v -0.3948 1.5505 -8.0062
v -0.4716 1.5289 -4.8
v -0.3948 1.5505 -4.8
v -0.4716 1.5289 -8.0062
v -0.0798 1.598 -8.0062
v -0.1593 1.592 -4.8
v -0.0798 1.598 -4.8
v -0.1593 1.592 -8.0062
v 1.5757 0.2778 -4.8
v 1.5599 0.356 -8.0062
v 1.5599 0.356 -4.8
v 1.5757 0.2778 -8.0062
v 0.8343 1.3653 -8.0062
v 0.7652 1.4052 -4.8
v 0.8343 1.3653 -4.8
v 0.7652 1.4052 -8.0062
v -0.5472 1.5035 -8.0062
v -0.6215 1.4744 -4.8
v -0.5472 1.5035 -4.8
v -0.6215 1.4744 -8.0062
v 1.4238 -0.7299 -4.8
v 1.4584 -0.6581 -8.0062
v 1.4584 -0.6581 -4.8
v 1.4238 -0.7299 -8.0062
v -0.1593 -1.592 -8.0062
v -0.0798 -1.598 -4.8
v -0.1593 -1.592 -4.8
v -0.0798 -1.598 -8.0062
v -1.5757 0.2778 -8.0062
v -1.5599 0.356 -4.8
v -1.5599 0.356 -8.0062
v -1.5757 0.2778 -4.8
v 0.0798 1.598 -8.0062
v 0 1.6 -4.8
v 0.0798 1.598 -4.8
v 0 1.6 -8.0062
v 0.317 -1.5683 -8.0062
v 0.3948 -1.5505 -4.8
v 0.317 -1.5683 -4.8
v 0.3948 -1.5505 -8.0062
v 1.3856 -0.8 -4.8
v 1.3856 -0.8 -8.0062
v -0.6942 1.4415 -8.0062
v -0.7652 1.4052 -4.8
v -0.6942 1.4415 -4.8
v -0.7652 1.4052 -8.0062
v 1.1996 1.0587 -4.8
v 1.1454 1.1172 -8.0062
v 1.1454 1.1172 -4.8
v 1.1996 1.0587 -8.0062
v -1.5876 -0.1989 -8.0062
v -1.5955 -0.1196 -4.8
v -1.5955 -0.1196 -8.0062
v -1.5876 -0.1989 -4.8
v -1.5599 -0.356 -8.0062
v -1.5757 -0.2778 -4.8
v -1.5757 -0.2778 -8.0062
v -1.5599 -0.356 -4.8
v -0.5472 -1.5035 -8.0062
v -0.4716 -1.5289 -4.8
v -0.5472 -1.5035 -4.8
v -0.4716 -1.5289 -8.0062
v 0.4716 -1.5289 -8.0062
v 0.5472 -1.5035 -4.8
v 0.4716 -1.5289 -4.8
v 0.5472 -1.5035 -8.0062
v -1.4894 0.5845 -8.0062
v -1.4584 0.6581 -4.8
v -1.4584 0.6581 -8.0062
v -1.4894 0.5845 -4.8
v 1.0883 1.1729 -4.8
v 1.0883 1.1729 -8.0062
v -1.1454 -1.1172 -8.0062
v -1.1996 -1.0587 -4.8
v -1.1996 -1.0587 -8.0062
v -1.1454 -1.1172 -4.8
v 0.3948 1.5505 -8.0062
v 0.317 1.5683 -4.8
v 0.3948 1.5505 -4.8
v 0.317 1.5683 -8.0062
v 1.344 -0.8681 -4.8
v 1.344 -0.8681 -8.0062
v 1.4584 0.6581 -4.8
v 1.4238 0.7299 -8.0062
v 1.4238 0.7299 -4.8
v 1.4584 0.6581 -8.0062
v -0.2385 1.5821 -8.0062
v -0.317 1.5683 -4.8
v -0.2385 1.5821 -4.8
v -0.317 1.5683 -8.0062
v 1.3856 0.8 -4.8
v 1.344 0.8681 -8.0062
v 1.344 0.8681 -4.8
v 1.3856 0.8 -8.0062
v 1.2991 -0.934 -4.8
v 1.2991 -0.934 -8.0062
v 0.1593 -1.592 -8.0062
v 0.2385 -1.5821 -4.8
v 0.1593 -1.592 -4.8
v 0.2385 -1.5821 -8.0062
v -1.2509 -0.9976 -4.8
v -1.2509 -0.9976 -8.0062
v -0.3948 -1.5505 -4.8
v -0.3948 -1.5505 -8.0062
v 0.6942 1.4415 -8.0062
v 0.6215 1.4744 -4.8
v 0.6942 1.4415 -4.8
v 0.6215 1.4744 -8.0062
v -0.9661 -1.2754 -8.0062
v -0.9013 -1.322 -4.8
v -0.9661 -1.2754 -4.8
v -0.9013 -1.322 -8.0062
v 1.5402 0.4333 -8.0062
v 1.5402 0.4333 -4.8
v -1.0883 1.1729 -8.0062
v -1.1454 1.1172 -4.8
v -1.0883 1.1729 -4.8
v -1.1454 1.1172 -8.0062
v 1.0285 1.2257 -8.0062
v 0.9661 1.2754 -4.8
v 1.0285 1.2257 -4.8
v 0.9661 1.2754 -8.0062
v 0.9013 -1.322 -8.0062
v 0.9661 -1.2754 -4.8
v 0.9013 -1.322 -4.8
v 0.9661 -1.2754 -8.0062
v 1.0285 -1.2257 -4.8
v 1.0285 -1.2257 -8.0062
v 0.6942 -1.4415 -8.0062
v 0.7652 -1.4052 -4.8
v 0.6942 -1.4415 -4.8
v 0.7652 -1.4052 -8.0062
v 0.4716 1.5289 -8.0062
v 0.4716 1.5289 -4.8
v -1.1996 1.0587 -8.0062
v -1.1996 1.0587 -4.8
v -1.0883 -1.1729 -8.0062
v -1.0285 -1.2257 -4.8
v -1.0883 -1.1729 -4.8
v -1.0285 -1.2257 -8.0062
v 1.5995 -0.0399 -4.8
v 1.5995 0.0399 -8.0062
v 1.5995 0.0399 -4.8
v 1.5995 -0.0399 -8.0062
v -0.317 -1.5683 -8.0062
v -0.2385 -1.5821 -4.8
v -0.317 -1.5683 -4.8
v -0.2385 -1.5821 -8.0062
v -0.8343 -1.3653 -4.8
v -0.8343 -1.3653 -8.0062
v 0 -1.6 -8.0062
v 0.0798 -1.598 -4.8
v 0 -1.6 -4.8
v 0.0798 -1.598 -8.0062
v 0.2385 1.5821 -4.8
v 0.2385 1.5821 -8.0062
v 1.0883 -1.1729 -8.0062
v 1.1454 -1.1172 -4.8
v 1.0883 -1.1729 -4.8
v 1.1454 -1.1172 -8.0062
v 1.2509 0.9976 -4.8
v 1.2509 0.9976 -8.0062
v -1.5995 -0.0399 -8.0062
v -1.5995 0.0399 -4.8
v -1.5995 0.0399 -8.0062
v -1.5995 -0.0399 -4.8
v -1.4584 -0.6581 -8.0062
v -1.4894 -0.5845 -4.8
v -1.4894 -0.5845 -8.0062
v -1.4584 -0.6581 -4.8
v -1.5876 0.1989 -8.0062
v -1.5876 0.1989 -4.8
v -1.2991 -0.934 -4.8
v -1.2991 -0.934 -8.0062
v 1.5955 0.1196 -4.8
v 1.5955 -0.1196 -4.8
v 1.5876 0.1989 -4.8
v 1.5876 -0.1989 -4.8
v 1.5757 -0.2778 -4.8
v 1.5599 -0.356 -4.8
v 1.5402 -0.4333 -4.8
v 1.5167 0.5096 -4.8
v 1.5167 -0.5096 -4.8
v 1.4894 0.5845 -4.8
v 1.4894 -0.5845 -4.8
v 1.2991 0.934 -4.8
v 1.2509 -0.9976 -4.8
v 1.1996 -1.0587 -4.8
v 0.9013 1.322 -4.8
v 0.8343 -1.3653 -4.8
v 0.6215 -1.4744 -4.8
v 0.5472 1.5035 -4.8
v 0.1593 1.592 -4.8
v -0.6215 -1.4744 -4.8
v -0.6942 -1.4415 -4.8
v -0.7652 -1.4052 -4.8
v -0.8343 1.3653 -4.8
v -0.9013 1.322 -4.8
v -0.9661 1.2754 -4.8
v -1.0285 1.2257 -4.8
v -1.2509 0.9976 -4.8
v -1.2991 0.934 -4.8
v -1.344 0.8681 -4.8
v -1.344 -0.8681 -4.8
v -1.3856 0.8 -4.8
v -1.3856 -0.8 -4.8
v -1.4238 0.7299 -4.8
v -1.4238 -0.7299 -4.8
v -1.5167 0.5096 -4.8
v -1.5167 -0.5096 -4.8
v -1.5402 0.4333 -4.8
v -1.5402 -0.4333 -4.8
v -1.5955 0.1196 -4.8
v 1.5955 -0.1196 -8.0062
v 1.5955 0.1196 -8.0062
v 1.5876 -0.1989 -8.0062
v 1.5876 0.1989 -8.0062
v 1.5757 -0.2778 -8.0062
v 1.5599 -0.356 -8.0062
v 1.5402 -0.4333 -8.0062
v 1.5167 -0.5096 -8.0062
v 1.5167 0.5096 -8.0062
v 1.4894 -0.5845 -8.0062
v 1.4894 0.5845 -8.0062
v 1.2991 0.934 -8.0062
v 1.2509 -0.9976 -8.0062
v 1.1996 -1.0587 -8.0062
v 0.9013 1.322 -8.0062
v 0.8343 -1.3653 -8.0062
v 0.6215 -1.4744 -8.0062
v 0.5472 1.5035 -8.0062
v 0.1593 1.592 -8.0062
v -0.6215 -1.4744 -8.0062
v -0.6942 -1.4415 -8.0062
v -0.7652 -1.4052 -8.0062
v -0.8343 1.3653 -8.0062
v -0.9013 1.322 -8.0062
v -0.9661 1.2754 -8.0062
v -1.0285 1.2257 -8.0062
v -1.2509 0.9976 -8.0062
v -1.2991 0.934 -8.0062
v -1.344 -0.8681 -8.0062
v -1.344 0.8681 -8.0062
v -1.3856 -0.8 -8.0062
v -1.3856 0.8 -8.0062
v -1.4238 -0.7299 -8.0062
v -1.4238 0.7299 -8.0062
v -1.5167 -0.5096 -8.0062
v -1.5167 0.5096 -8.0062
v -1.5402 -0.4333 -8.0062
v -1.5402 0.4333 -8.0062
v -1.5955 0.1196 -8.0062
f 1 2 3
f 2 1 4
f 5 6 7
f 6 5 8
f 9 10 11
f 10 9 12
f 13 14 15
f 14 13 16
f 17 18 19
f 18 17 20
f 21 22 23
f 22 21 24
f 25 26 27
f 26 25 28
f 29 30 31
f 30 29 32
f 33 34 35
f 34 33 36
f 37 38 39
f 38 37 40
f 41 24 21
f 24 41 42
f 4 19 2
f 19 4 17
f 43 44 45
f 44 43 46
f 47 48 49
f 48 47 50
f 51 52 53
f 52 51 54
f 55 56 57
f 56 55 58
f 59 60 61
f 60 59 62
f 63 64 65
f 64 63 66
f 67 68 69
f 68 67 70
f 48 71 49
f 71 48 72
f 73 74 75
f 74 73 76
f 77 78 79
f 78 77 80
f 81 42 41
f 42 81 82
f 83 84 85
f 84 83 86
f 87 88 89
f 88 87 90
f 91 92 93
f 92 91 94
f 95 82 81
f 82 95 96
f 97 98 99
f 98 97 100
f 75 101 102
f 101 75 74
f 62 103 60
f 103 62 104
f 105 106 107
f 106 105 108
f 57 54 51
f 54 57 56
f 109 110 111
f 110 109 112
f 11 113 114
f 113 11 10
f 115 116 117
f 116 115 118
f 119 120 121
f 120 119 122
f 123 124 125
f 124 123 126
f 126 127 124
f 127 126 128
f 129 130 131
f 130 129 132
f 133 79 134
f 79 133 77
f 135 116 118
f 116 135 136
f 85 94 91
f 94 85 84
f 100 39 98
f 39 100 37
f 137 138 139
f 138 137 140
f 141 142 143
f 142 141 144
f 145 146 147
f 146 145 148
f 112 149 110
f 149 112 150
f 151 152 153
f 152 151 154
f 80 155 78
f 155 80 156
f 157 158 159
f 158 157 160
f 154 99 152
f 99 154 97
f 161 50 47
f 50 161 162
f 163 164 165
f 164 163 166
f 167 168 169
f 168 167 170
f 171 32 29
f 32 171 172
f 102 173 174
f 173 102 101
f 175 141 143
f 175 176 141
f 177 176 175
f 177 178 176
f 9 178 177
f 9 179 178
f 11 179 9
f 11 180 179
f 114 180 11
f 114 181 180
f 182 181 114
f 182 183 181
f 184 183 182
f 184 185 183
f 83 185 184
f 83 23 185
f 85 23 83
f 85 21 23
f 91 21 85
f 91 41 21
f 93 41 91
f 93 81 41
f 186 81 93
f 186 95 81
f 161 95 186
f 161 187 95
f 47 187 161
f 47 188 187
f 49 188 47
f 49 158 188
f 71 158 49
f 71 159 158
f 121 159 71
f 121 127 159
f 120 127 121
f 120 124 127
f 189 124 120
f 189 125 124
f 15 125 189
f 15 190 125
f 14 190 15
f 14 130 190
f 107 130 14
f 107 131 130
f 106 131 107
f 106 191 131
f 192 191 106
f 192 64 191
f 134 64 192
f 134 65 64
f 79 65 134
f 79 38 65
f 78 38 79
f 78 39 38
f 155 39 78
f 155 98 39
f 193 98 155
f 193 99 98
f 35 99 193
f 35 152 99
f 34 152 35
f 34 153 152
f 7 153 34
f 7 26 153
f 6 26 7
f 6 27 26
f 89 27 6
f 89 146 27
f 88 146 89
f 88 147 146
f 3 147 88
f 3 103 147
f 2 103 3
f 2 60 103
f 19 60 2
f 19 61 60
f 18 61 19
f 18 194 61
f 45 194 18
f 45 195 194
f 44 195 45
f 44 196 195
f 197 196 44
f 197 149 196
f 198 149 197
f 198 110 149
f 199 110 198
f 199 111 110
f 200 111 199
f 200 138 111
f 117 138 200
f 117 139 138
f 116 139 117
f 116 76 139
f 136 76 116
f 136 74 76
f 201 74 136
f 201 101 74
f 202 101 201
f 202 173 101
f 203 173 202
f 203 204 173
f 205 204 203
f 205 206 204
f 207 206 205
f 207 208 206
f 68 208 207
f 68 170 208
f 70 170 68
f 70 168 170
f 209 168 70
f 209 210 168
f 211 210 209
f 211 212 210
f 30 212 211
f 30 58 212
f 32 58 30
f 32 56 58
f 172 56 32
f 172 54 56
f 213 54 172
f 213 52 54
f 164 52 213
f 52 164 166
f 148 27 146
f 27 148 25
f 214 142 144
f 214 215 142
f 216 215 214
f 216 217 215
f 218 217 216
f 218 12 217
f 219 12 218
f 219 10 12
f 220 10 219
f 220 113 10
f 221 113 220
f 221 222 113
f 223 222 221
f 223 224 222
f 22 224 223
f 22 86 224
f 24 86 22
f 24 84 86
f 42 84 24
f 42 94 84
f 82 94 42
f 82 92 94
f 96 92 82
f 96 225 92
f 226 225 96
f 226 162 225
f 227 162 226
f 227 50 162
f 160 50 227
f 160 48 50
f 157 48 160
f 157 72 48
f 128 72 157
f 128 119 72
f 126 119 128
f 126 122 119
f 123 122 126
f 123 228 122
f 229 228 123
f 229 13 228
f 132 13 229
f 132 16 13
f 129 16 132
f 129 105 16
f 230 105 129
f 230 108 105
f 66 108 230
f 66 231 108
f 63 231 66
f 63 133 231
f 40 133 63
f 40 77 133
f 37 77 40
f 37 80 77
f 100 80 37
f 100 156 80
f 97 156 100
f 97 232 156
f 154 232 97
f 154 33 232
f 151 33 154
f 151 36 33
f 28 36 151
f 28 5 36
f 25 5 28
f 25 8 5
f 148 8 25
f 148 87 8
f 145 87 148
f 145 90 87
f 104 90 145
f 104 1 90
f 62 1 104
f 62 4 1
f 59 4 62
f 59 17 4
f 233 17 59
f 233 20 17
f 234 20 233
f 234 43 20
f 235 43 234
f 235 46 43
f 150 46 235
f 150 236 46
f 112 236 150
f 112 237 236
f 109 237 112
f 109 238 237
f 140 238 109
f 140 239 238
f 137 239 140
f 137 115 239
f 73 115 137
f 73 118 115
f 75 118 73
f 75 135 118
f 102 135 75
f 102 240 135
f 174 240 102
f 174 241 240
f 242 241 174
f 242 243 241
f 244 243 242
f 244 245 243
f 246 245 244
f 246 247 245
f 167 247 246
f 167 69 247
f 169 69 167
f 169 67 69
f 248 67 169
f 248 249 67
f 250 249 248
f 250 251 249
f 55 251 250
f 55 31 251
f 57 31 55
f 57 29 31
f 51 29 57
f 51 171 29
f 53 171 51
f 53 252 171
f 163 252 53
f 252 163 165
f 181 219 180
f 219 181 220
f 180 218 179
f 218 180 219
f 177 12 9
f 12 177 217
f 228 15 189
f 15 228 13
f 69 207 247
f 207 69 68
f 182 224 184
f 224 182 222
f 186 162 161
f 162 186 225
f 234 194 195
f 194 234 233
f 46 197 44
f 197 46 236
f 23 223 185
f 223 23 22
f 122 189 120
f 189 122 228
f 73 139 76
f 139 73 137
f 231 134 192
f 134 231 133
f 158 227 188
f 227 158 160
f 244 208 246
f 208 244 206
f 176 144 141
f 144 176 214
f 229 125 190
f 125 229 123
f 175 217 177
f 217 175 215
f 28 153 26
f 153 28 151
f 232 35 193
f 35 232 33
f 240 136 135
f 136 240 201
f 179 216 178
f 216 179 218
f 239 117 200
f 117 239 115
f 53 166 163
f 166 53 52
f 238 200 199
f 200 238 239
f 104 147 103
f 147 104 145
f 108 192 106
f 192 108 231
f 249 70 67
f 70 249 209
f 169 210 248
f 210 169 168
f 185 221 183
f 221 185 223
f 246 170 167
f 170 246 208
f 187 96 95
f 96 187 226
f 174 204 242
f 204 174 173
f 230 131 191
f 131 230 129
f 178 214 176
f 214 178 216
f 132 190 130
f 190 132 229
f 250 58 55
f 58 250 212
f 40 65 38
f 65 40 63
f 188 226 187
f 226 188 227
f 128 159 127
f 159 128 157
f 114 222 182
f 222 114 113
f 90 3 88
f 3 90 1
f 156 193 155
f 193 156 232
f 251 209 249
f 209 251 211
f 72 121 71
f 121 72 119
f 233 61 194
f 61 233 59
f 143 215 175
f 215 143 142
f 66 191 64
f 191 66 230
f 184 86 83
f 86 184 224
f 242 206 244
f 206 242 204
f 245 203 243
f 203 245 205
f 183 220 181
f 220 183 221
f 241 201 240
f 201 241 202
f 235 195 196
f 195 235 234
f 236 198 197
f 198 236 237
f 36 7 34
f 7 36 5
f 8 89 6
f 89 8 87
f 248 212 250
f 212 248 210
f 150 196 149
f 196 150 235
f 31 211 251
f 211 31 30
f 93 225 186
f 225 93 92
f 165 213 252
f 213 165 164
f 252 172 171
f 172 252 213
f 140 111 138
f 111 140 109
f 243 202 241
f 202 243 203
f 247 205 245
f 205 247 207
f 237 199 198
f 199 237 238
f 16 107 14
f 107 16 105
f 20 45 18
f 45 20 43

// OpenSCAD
use <../lib.scad>
use <../p/48/1-8chrd.scad>
use <../p/48/1-8cyli.scad>
use <../p/48/1-8edge.scad>
use <../p/48/4-4con12.scad>
use <../p/48/4-4cyli.scad>
use <../p/48/4-4edge.scad>
use <../p/48/4-4ndis.scad>
use <../p/48/4-4rin12.scad>
use <../p/48/4-4rin14.scad>
use <../p/48/4-4ring1.scad>
use <../p/48/4-4ring3.scad>
use <../p/48/4-4ring4.scad>
use <../p/48/4-4ring5.scad>
use <../p/48/4-4ring6.scad>
use <../p/rect.scad>
use <../p/stud3.scad>
$fa=1; $fs=0.2;
function ldraw_lib__4141(realsolid=false) = [
// 0 ~Technic Differential Casing
// 0 Name: 4141.dat
// 0 Author: Philippe Hurbain [Philo]
// 0 !LDRAW_ORG Part UPDATE 2011-02
// 0 !LICENSE Licensed under CC BY 2.0 and CC BY 4.0 : see CAreadme.txt
// 
// 0 BFC CERTIFY CCW
  [0,"BFC","CERTIFY"],
  [0,"BFC","CCW"],
// 
// 0 !HISTORY 2007-10-26 [Philo] Split from 73071
// 0 !HISTORY 2011-12-29 [PTadmin] Official Update 2011-02
// 
// 
// 1 16 0 0 -26 10 0 0 0 0 10 0 1 0 48\4-4edge.dat
  [1,16,0,0,-26,10,0,0,0,0,10,0,1,0, ldraw_lib__48__4_4edge(realsolid)],
// 1 16 0 0 -40 10 0 0 0 0 10 0 1 0 48\4-4edge.dat
  [1,16,0,0,-40,10,0,0,0,0,10,0,1,0, ldraw_lib__48__4_4edge(realsolid)],
// 0 BFC INVERTNEXT
  [0,"BFC","INVERTNEXT"],
// 1 16 0 0 -20 6 0 0 0 0 6 0 -20 0 48\4-4cyli.dat
  [1,16,0,0,-20,6,0,0,0,0,6,0,-20,0, ldraw_lib__48__4_4cyli(realsolid)],
// 1 16 0 0 -26 10 0 0 0 0 10 0 -14 0 48\4-4cyli.dat
  [1,16,0,0,-26,10,0,0,0,0,10,0,-14,0, ldraw_lib__48__4_4cyli(realsolid)],
// 1 16 0 20 0 10 0 0 0 1 0 0 0 20 rect.dat
  [1,16,0,20,0,10,0,0,0,1,0,0,0,20, ldraw_lib__rect(realsolid)],
// 1 16 0 -20 0 10 0 0 0 -1 0 0 0 20 rect.dat
  [1,16,0,-20,0,10,0,0,0,-1,0,0,0,20, ldraw_lib__rect(realsolid)],
// 1 16 0 20 0 1 0 0 0 2 0 0 0 1 stud3.dat
  [1,16,0,20,0,1,0,0,0,2,0,0,0,1, ldraw_lib__stud3(realsolid)],
// 2 24 10 24 -26 10 -24 -26
  [2,24,10,24,-26,10,-24,-26],
// 2 24 -10 24 -26 -10 -24 -26
  [2,24,-10,24,-26,-10,-24,-26],
// 2 24 10 20 -20 10 -20 -20
  [2,24,10,20,-20,10,-20,-20],
// 2 24 -10 20 -20 -10 -20 -20
  [2,24,-10,20,-20,-10,-20,-20],
// 2 24 10 24 20 10 20 20
  [2,24,10,24,20,10,20,20],
// 2 24 -10 24 20 -10 20 20
  [2,24,-10,24,20,-10,20,20],
// 2 24 10 -24 20 10 -20 20
  [2,24,10,-24,20,10,-20,20],
// 2 24 -10 -24 20 -10 -20 20
  [2,24,-10,-24,20,-10,-20,20],
// 2 24 10 24 -26 10 24 20
  [2,24,10,24,-26,10,24,20],
// 2 24 -10 24 -26 -10 24 20
  [2,24,-10,24,-26,-10,24,20],
// 2 24 10 -24 -26 10 -24 20
  [2,24,10,-24,-26,10,-24,20],
// 2 24 -10 -24 -26 -10 -24 20
  [2,24,-10,-24,-26,-10,-24,20],
// 1 16 0 0 -20 6 0 0 0 0 6 0 -1 0 48\4-4ndis.dat
  [1,16,0,0,-20,6,0,0,0,0,6,0,-1,0, ldraw_lib__48__4_4ndis(realsolid)],
// 4 16 -10 20 -20 -6 6 -20 6 6 -20 10 20 -20
  [4,16,-10,20,-20,-6,6,-20,6,6,-20,10,20,-20],
// 4 16 10 20 -20 6 6 -20 6 -6 -20 10 -20 -20
  [4,16,10,20,-20,6,6,-20,6,-6,-20,10,-20,-20],
// 4 16 10 -20 -20 6 -6 -20 -6 -6 -20 -10 -20 -20
  [4,16,10,-20,-20,6,-6,-20,-6,-6,-20,-10,-20,-20],
// 4 16 -10 -20 -20 -6 -6 -20 -6 6 -20 -10 20 -20
  [4,16,-10,-20,-20,-6,-6,-20,-6,6,-20,-10,20,-20],
// 1 16 0 0 -26 10 0 0 0 0 10 0 1 0 48\4-4ndis.dat
  [1,16,0,0,-26,10,0,0,0,0,10,0,1,0, ldraw_lib__48__4_4ndis(realsolid)],
// 4 16 10 -10 -26 10 -24 -26 -10 -24 -26 -10 -10 -26
  [4,16,10,-10,-26,10,-24,-26,-10,-24,-26,-10,-10,-26],
// 4 16 10 -24 -26 9.95 -24.021 -26 -9.95 -24.021 -26 -10 -24 -26
  [4,16,10,-24,-26,9.95,-24.021,-26,-9.95,-24.021,-26,-10,-24,-26],
// 4 16 -10 24 -26 -9.95 24.021 -26 9.95 24.021 -26 10 24 -26
  [4,16,-10,24,-26,-9.95,24.021,-26,9.95,24.021,-26,10,24,-26],
// 2 24 10 -24 -26 9.95 -24.021 -26
  [2,24,10,-24,-26,9.95,-24.021,-26],
// 4 16 10 -24 17 9.95 -24.021 17 9.95 -24.021 -26 10 -24 -26
  [4,16,10,-24,17,9.95,-24.021,17,9.95,-24.021,-26,10,-24,-26],
// 4 16 -10 -24 -26 -9.95 -24.021 -26 -9.95 -24.021 17 -10 -24 17
  [4,16,-10,-24,-26,-9.95,-24.021,-26,-9.95,-24.021,17,-10,-24,17],
// 4 16 -10 24 17 -9.95 24.021 17 -9.95 24.021 -26 -10 24 -26
  [4,16,-10,24,17,-9.95,24.021,17,-9.95,24.021,-26,-10,24,-26],
// 4 16 10 24 -26 9.95 24.021 -26 9.95 24.021 17 10 24 17
  [4,16,10,24,-26,9.95,24.021,-26,9.95,24.021,17,10,24,17],
// 2 24 -10 -24 -26 -9.95 -24.021 -26
  [2,24,-10,-24,-26,-9.95,-24.021,-26],
// 2 24 -10 24 -26 -9.95 24.021 -26
  [2,24,-10,24,-26,-9.95,24.021,-26],
// 2 24 10 24 -26 9.95 24.021 -26
  [2,24,10,24,-26,9.95,24.021,-26],
// 4 16 -10 10 -26 -10 24 -26 10 24 -26 10 10 -26
  [4,16,-10,10,-26,-10,24,-26,10,24,-26,10,10,-26],
// 4 16 10 24 -26 10 20 -20 10 -20 -20 10 -24 -26
  [4,16,10,24,-26,10,20,-20,10,-20,-20,10,-24,-26],
// 4 16 -10 -24 -26 -10 -20 -20 -10 20 -20 -10 24 -26
  [4,16,-10,-24,-26,-10,-20,-20,-10,20,-20,-10,24,-26],
// 4 16 10 24 20 10 20 20 10 20 -20 10 24 -26
  [4,16,10,24,20,10,20,20,10,20,-20,10,24,-26],
// 4 16 -10 24 -26 -10 20 -20 -10 20 20 -10 24 20
  [4,16,-10,24,-26,-10,20,-20,-10,20,20,-10,24,20],
// 4 16 10 -24 -26 10 -20 -20 10 -20 20 10 -24 20
  [4,16,10,-24,-26,10,-20,-20,10,-20,20,10,-24,20],
// 4 16 -10 -24 20 -10 -20 20 -10 -20 -20 -10 -24 -26
  [4,16,-10,-24,20,-10,-20,20,-10,-20,-20,-10,-24,-26],
// 1 16 0 0 -26 -9.95 0 24.021 -24.021 0 -9.95 0 46 0 48\1-8cyli.dat
  [1,16,0,0,-26,-9.95,0,24.021,-24.021,0,-9.95,0,46,0, ldraw_lib__48__1_8cyli(realsolid)],
// 1 16 0 0 -26 9.95 0 -24.021 24.021 0 9.95 0 46 0 48\1-8cyli.dat
  [1,16,0,0,-26,9.95,0,-24.021,24.021,0,9.95,0,46,0, ldraw_lib__48__1_8cyli(realsolid)],
// 1 16 0 0 -26 9.95 0 -24.021 24.021 0 9.95 0 43 0 48\1-8edge.dat
  [1,16,0,0,-26,9.95,0,-24.021,24.021,0,9.95,0,43,0, ldraw_lib__48__1_8edge(realsolid)],
// 1 16 0 0 -26 -9.95 0 24.021 -24.021 0 -9.95 0 43 0 48\1-8edge.dat
  [1,16,0,0,-26,-9.95,0,24.021,-24.021,0,-9.95,0,43,0, ldraw_lib__48__1_8edge(realsolid)],
// 1 16 0 0 -20 6 0 0 0 0 6 0 1 0 48\4-4edge.dat
  [1,16,0,0,-20,6,0,0,0,0,6,0,1,0, ldraw_lib__48__4_4edge(realsolid)],
// 1 16 0 0 -40 2 0 0 0 0 2 0 1 0 48\4-4ring3.dat
  [1,16,0,0,-40,2,0,0,0,0,2,0,1,0, ldraw_lib__48__4_4ring3(realsolid)],
// 1 16 0 0 -40 2 0 0 0 0 2 0 1 0 48\4-4ring4.dat
  [1,16,0,0,-40,2,0,0,0,0,2,0,1,0, ldraw_lib__48__4_4ring4(realsolid)],
// 1 16 0 0 -26 -9.95 0 24.021 -24.021 0 -9.95 0 43 0 48\1-8chrd.dat
  [1,16,0,0,-26,-9.95,0,24.021,-24.021,0,-9.95,0,43,0, ldraw_lib__48__1_8chrd(realsolid)],
// 1 16 0 0 -26 9.95 0 -24.021 24.021 0 9.95 0 43 0 48\1-8chrd.dat
  [1,16,0,0,-26,9.95,0,-24.021,24.021,0,9.95,0,43,0, ldraw_lib__48__1_8chrd(realsolid)],
// 1 16 0 0 -40 6 0 0 0 0 6 0 1 0 48\4-4edge.dat
  [1,16,0,0,-40,6,0,0,0,0,6,0,1,0, ldraw_lib__48__4_4edge(realsolid)],
// 1 16 0 0 40 6 0 0 0 0 6 0 1 0 48\4-4edge.dat
  [1,16,0,0,40,6,0,0,0,0,6,0,1,0, ldraw_lib__48__4_4edge(realsolid)],
// 1 16 0 0 40 2 0 0 0 0 2 0 -1 0 48\4-4ring3.dat
  [1,16,0,0,40,2,0,0,0,0,2,0,-1,0, ldraw_lib__48__4_4ring3(realsolid)],
// 1 16 0 0 26 4 0 0 0 0 4 0 -1 0 48\4-4ring5.dat
  [1,16,0,0,26,4,0,0,0,0,4,0,-1,0, ldraw_lib__48__4_4ring5(realsolid)],
// 1 16 0 0 26 2 0 0 0 0 2 0 -1 0 48\4-4ring5.dat
  [1,16,0,0,26,2,0,0,0,0,2,0,-1,0, ldraw_lib__48__4_4ring5(realsolid)],
// 1 16 0 0 26 2 0 0 0 0 2 0 -1 0 48\4-4ring6.dat
  [1,16,0,0,26,2,0,0,0,0,2,0,-1,0, ldraw_lib__48__4_4ring6(realsolid)],
// 1 16 0 0 25 1 0 0 0 0 1 0 -1 0 48\4-4rin14.dat
  [1,16,0,0,25,1,0,0,0,0,1,0,-1,0, ldraw_lib__48__4_4rin14(realsolid)],
// 1 16 0 0 25 5 0 0 0 0 5 0 -1 0 48\4-4ring3.dat
  [1,16,0,0,25,5,0,0,0,0,5,0,-1,0, ldraw_lib__48__4_4ring3(realsolid)],
// 1 16 0 0 40 2 0 0 0 0 2 0 -1 0 48\4-4ring4.dat
  [1,16,0,0,40,2,0,0,0,0,2,0,-1,0, ldraw_lib__48__4_4ring4(realsolid)],
// 1 16 0 0 40 10 0 0 0 0 10 0 1 0 48\4-4edge.dat
  [1,16,0,0,40,10,0,0,0,0,10,0,1,0, ldraw_lib__48__4_4edge(realsolid)],
// 1 16 0 0 26 14 0 0 0 0 14 0 1 0 48\4-4edge.dat
  [1,16,0,0,26,14,0,0,0,0,14,0,1,0, ldraw_lib__48__4_4edge(realsolid)],
// 1 16 0 0 26 20 0 0 0 0 20 0 1 0 48\4-4edge.dat
  [1,16,0,0,26,20,0,0,0,0,20,0,1,0, ldraw_lib__48__4_4edge(realsolid)],
// 1 16 0 0 26 10 0 0 0 0 10 0 1 0 48\4-4edge.dat
  [1,16,0,0,26,10,0,0,0,0,10,0,1,0, ldraw_lib__48__4_4edge(realsolid)],
// 1 16 0 0 25 14 0 0 0 0 14 0 1 0 48\4-4edge.dat
  [1,16,0,0,25,14,0,0,0,0,14,0,1,0, ldraw_lib__48__4_4edge(realsolid)],
// 1 16 0 0 20 6 0 0 0 0 6 0 1 0 48\4-4edge.dat
  [1,16,0,0,20,6,0,0,0,0,6,0,1,0, ldraw_lib__48__4_4edge(realsolid)],
// 1 16 0 0 20 6 0 0 0 0 6 0 1 0 48\4-4ring1.dat
  [1,16,0,0,20,6,0,0,0,0,6,0,1,0, ldraw_lib__48__4_4ring1(realsolid)],
// 1 16 0 0 20 12 0 0 0 0 12 0 1 0 48\4-4ring1.dat
  [1,16,0,0,20,12,0,0,0,0,12,0,1,0, ldraw_lib__48__4_4ring1(realsolid)],
// 0 BFC INVERTNEXT
  [0,"BFC","INVERTNEXT"],
// 1 16 0 0 40 6 0 0 0 0 6 0 -20 0 48\4-4cyli.dat
  [1,16,0,0,40,6,0,0,0,0,6,0,-20,0, ldraw_lib__48__4_4cyli(realsolid)],
// 1 16 0 0 40 10 0 0 0 0 10 0 -14 0 48\4-4cyli.dat
  [1,16,0,0,40,10,0,0,0,0,10,0,-14,0, ldraw_lib__48__4_4cyli(realsolid)],
// 1 16 0 0 26 14 0 0 0 0 14 0 -1 0 48\4-4cyli.dat
  [1,16,0,0,26,14,0,0,0,0,14,0,-1,0, ldraw_lib__48__4_4cyli(realsolid)],
// 0 BFC INVERTNEXT
  [0,"BFC","INVERTNEXT"],
// 1 16 0 0 26 20 0 0 0 0 20 0 -1 0 48\4-4cyli.dat
  [1,16,0,0,26,20,0,0,0,0,20,0,-1,0, ldraw_lib__48__4_4cyli(realsolid)],
// 1 16 0 0 25 20 0 0 0 0 20 0 1 0 48\4-4edge.dat
  [1,16,0,0,25,20,0,0,0,0,20,0,1,0, ldraw_lib__48__4_4edge(realsolid)],
// 1 16 0 0 20 2 0 0 0 0 2 0 1 0 48\4-4rin12.dat
  [1,16,0,0,20,2,0,0,0,0,2,0,1,0, ldraw_lib__48__4_4rin12(realsolid)],
// 1 16 0 0 26 24 0 0 0 0 24 0 -1 0 48\4-4cyli.dat
  [1,16,0,0,26,24,0,0,0,0,24,0,-1,0, ldraw_lib__48__4_4cyli(realsolid)],
// 1 16 0 0 26 24 0 0 0 0 24 0 1 0 48\4-4edge.dat
  [1,16,0,0,26,24,0,0,0,0,24,0,1,0, ldraw_lib__48__4_4edge(realsolid)],
// 1 16 0 0 20 26 0 0 0 0 26 0 1 0 48\4-4edge.dat
  [1,16,0,0,20,26,0,0,0,0,26,0,1,0, ldraw_lib__48__4_4edge(realsolid)],
// 1 16 0 0 25 24 0 0 0 0 24 0 1 0 48\4-4edge.dat
  [1,16,0,0,25,24,0,0,0,0,24,0,1,0, ldraw_lib__48__4_4edge(realsolid)],
// 1 16 0 0 20 2 0 0 0 0 -2 0 5 0 48\4-4con12.dat
  [1,16,0,0,20,2,0,0,0,0,-2,0,5,0, ldraw_lib__48__4_4con12(realsolid)],
// 0
];
module ldraw_lib__4141(step=0, col=false, unit=2/5, alt=false, line=0.2, solid=!$preview)
    makepoly(ldraw_lib__4141(solid), step=step, col=col, unit=unit, alt=alt, line=line, solid=solid);
ldraw_lib__4141(line=0.2);
